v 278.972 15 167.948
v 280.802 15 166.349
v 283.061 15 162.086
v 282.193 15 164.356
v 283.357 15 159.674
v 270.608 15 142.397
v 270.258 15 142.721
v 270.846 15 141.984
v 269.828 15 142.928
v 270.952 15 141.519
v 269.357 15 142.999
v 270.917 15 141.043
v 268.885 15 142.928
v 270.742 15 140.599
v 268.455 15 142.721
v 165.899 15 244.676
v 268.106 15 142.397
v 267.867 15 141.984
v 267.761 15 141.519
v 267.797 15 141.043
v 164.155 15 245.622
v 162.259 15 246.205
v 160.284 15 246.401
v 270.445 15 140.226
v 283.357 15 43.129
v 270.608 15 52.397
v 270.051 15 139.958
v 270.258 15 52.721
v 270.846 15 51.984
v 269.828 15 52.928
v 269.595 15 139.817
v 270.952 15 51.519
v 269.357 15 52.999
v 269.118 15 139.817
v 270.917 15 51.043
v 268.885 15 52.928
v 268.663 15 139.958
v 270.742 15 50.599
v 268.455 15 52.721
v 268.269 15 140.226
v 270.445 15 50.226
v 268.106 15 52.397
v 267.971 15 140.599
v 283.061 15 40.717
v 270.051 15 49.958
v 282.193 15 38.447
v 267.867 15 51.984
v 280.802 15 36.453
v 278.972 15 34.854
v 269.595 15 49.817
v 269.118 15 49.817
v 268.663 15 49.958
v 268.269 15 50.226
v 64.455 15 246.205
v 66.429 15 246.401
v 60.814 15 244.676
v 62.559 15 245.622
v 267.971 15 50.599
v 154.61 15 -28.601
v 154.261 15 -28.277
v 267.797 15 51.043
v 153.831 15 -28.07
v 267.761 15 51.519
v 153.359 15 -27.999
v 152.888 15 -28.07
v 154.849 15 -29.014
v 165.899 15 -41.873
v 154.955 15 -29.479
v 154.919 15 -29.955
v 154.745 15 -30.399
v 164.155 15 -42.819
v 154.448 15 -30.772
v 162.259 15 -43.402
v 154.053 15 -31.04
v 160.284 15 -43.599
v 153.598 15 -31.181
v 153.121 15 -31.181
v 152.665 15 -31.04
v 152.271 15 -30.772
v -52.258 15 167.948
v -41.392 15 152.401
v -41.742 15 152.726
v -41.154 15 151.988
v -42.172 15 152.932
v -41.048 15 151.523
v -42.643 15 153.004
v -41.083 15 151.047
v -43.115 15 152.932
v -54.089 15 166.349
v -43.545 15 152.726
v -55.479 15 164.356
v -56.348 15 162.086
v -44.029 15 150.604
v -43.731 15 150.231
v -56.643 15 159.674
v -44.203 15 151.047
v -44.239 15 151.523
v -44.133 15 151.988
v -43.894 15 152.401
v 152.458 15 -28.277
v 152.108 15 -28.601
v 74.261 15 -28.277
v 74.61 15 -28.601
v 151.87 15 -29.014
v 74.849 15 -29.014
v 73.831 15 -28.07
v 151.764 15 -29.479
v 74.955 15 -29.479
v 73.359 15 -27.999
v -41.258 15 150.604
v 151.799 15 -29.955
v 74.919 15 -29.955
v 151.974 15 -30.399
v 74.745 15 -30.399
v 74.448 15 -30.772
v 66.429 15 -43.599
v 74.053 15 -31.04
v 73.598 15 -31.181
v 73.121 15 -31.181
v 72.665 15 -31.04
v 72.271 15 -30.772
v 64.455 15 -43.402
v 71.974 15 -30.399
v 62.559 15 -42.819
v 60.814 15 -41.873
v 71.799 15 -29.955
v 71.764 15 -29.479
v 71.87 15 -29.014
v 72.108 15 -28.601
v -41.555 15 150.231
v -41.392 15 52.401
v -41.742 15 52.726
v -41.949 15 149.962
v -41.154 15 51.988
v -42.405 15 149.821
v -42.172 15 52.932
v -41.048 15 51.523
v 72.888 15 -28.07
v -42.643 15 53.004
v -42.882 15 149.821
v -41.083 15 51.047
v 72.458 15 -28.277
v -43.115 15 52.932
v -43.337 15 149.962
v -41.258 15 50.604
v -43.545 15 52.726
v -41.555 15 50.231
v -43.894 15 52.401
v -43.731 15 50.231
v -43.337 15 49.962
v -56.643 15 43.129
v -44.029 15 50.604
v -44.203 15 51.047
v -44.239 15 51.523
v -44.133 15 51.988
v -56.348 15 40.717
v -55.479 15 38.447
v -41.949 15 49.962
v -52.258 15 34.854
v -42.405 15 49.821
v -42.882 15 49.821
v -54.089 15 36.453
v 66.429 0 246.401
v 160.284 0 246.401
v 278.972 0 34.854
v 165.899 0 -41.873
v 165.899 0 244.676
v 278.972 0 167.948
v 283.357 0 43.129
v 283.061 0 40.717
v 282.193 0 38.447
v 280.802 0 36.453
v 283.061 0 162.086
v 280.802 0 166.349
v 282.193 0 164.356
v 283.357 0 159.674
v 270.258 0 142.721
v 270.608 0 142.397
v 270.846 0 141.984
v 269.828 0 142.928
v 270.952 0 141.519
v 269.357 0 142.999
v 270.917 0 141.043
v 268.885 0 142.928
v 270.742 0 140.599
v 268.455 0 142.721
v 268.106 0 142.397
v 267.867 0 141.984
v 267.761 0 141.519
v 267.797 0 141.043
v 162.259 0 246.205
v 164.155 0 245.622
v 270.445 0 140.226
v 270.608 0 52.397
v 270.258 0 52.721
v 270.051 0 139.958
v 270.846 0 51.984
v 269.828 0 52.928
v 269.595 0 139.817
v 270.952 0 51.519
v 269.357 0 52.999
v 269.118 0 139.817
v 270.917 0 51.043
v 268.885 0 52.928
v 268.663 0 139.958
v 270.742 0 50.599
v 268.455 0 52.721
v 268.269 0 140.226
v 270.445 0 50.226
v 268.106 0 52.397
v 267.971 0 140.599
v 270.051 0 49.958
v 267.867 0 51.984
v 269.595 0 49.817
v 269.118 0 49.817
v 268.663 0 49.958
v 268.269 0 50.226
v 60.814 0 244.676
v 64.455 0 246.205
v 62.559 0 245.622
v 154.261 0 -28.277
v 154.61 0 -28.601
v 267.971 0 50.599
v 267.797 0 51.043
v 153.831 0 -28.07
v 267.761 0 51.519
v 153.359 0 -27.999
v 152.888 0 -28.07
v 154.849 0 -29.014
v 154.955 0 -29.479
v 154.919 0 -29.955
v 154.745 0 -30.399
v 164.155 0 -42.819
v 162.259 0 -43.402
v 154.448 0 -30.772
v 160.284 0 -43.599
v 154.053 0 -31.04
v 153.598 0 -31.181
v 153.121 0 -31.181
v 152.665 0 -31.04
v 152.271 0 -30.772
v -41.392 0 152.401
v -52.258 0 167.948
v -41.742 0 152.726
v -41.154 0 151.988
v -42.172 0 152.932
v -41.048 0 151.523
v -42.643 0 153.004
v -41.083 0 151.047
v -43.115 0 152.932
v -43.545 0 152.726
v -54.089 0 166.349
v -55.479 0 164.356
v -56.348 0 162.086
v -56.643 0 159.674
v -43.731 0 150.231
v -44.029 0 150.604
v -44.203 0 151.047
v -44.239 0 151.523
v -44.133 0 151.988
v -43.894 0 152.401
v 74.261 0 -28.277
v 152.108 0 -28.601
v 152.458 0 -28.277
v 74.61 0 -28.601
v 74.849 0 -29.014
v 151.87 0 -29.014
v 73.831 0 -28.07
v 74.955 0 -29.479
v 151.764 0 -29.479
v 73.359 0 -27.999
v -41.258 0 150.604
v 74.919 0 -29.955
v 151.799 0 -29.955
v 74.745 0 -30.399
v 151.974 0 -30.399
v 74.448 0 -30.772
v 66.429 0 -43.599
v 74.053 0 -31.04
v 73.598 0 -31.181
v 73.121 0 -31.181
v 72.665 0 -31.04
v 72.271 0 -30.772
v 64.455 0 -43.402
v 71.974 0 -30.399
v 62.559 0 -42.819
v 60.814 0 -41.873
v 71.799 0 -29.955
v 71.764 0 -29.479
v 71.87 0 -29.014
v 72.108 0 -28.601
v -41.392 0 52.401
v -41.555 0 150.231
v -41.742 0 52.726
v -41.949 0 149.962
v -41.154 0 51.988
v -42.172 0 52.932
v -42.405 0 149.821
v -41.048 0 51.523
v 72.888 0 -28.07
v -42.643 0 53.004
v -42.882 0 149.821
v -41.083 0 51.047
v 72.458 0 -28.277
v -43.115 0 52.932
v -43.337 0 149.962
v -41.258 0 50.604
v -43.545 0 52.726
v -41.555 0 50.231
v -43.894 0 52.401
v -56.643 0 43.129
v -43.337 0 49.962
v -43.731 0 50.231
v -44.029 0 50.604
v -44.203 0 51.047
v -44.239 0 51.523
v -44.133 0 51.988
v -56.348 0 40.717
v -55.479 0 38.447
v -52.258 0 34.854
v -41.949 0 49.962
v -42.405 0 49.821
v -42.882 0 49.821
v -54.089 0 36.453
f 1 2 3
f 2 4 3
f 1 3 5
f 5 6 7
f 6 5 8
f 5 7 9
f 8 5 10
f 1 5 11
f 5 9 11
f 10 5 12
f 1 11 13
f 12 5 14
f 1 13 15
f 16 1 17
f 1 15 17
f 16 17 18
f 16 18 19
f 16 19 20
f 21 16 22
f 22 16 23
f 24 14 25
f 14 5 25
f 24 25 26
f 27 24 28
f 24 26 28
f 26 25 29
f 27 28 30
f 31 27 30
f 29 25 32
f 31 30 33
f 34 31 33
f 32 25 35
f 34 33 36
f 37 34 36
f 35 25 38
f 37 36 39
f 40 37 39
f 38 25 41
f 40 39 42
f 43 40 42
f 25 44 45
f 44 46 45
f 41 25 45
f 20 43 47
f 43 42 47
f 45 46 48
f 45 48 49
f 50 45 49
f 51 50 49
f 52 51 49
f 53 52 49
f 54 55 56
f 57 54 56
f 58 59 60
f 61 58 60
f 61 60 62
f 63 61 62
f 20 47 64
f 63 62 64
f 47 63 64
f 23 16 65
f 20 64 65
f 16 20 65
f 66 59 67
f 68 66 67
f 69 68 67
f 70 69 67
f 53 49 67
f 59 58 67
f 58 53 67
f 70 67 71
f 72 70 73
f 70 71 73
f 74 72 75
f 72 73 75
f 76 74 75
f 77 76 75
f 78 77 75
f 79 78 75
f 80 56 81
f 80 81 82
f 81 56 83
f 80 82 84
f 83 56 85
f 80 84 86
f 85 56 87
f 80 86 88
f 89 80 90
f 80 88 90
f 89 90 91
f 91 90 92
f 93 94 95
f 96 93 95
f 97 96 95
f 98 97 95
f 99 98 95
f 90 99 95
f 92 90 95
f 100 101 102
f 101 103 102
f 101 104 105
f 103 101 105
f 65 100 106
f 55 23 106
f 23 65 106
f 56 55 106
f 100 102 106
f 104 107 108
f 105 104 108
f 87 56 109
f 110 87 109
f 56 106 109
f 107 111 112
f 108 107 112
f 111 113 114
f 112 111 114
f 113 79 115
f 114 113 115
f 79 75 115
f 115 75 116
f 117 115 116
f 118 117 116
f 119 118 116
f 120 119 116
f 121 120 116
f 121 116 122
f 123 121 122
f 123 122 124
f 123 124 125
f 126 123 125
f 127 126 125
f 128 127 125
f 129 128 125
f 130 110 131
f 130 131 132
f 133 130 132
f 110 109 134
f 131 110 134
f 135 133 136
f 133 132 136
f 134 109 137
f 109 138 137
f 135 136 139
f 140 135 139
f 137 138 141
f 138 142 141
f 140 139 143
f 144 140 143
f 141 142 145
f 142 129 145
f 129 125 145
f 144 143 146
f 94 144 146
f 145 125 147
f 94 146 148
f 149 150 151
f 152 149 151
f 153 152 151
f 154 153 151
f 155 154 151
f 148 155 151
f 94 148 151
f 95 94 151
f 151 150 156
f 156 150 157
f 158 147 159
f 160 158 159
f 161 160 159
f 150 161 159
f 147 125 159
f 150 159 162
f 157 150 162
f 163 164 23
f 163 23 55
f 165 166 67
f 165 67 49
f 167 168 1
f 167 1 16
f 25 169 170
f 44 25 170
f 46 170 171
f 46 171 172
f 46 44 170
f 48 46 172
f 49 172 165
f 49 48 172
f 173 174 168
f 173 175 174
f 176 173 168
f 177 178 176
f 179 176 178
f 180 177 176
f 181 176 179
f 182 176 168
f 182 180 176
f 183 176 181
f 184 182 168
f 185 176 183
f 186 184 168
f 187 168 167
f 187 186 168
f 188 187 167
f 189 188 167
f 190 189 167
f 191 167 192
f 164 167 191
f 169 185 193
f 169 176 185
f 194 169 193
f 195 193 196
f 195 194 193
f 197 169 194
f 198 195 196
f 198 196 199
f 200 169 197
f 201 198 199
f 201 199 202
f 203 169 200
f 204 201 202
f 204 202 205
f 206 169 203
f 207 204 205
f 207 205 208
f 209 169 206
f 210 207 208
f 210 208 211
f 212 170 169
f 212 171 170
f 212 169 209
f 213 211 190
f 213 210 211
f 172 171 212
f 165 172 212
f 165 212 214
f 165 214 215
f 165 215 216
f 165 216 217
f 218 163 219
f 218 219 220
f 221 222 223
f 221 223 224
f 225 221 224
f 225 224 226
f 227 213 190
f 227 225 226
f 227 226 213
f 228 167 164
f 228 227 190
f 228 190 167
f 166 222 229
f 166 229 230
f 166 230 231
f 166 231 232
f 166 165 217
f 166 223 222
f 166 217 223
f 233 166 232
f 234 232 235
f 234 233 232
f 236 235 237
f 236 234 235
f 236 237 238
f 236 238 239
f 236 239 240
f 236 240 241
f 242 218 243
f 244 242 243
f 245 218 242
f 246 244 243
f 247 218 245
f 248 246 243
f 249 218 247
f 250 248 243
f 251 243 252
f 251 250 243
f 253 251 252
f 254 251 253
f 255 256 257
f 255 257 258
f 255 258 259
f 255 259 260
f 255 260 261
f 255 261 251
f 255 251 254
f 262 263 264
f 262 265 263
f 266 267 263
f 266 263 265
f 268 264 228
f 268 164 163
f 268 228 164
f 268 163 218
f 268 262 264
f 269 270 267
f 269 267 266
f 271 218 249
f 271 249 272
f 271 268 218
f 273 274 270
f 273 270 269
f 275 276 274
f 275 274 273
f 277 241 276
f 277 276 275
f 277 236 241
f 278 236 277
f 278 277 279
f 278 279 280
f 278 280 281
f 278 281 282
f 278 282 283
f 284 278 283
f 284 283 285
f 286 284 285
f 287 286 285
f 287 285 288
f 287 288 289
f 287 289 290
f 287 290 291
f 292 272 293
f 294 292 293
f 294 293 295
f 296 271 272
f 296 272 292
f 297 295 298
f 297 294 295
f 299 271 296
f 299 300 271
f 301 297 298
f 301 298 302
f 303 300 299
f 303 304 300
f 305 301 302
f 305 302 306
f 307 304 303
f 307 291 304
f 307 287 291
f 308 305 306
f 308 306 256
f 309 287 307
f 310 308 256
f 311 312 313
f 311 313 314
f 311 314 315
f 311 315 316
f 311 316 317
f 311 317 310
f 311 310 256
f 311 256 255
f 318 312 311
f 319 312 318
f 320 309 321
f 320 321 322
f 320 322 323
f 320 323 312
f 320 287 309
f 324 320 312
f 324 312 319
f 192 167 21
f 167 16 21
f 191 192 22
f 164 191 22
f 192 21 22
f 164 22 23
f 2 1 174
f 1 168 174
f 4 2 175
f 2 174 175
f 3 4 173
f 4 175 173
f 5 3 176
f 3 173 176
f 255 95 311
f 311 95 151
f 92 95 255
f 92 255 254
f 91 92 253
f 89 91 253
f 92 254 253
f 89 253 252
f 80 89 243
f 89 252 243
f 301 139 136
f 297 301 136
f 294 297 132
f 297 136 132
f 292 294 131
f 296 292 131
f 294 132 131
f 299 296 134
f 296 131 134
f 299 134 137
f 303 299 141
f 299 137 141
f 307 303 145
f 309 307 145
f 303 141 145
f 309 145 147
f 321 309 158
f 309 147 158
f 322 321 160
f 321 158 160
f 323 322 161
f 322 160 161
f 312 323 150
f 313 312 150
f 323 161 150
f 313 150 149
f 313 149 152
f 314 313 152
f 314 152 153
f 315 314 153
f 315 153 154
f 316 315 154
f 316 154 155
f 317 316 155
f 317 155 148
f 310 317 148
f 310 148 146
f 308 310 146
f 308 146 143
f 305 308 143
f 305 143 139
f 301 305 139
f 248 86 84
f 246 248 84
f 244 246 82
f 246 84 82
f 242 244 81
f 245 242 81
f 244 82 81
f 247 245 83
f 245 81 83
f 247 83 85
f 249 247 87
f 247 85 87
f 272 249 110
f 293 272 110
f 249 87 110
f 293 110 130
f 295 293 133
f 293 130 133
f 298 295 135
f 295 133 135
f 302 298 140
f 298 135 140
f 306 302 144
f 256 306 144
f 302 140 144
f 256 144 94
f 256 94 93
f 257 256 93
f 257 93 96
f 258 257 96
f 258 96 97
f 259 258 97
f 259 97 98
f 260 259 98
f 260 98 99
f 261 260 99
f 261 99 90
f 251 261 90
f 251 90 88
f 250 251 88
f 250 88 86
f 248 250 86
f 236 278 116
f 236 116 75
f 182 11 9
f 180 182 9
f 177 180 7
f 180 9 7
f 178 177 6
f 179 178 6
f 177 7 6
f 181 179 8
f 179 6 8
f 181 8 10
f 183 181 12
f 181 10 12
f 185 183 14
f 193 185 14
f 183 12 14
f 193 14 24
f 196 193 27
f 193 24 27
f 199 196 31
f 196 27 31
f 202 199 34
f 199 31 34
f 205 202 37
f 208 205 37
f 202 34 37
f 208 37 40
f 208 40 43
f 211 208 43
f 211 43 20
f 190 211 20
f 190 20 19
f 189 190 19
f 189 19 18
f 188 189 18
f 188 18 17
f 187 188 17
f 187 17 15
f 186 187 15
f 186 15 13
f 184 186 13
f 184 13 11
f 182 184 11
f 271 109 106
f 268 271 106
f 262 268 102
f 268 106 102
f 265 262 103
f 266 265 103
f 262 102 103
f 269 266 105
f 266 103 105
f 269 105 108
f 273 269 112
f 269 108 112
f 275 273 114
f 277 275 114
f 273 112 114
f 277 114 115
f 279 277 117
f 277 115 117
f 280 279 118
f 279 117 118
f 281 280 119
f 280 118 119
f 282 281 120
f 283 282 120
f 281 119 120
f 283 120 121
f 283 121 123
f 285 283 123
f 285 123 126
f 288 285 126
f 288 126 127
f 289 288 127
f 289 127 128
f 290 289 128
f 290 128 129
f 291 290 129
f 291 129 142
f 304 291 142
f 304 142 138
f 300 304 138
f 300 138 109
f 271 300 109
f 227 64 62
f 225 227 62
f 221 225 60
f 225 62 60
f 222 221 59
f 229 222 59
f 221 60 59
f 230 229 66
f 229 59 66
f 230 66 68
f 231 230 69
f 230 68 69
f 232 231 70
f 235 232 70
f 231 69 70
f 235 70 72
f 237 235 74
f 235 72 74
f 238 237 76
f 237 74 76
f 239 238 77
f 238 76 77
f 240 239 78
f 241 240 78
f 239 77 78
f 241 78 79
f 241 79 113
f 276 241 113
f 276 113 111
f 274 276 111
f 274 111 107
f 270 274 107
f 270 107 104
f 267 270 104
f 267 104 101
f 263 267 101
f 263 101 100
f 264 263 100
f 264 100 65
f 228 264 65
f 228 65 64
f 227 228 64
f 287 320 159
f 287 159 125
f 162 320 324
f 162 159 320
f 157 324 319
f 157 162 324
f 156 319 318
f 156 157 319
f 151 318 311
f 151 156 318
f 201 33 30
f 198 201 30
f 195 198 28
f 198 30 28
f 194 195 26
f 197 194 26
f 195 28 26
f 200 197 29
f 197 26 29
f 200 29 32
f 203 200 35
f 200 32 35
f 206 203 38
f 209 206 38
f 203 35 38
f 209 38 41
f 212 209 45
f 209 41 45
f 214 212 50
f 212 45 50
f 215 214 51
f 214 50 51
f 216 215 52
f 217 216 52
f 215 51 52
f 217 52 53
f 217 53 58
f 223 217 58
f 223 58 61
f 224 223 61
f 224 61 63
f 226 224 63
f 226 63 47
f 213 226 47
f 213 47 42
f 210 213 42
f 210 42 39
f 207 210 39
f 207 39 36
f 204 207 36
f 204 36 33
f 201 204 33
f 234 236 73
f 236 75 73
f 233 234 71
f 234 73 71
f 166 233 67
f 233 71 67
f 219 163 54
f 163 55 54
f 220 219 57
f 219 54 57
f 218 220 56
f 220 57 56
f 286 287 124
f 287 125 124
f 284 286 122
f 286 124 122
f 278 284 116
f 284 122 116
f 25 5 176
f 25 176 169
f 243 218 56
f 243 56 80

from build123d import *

# Parameters (mm, degrees)
BOSS_EXTRU_1_DEPTH       = 15
CONG_10_R                = 10
ENL_V_MAT_EXTRU_13_REACH = 393.106
ESQUISSE13_W             = 20
ESQUISSE13_H             = 143.033455182
ESQUISSE13_H_2           = 181.308681646
CONG_12_R                = 10
ENL_V_MAT_EXTRU_14_REACH = 377.805
ESQUISSE14_R             = 1.6


with BuildPart() as part:
    # Esquisse1 → Boss.-Extru.1 (new body)
    with BuildSketch(Plane(origin=(0, 0, 0), x_dir=(1, 0, 0), z_dir=(0, 1, 0))):
        Polygon((-76.643189126, -51.401333399), (63.356810874, 43.598666601), (163.356810874, 43.598666601), (303.356810874, -51.401333399), (303.356810874, -151.401333399), (163.356810874, -246.401333399), (63.356810874, -246.401333399), (-76.643189126, -151.401333399), align=None)
    extrude(amount=BOSS_EXTRU_1_DEPTH)

    # Congé10
    cong_10_edges = [part.edges().sort_by_distance(p)[0] for p in [
        (-76.643189126, 7.5, 51.401333399),
        (63.356810874, 7.5, -43.598666601),
        (163.356810874, 7.5, -43.598666601),
        (303.356810874, 7.5, 51.401333399),
        (303.356810874, 7.5, 151.401333399),
        (163.356810874, 7.5, 246.401333399),
        (63.356810874, 7.5, 246.401333399),
        (-76.643189126, 7.5, 151.401333399),
    ]]
    fillet(cong_10_edges, radius=CONG_10_R)

    # Esquisse13 → Enlèv. mat.-Extru.13 (cut, up to next)
    with BuildSketch(Plane(origin=(0, 15, 0), x_dir=(1, 0, 0), z_dir=(0, 1, 0)), mode=Mode.PRIVATE) as enl_v_mat_extru_13_sk1:
        with Locations((-66.643189126, -101.968599131)):
            Rectangle(ESQUISSE13_W, ESQUISSE13_H)
    enl_v_mat_extru_13_tool1 = extrude(enl_v_mat_extru_13_sk1.sketch, amount=-ENL_V_MAT_EXTRU_13_REACH, mode=Mode.PRIVATE) & part.part
    # Esquisse13 → Enlèv. mat.-Extru.13 (cut, up to next)
    with BuildSketch(Plane(origin=(0, 15, 0), x_dir=(1, 0, 0), z_dir=(0, 1, 0)), mode=Mode.PRIVATE) as enl_v_mat_extru_13_sk2:
        with Locations((293.356810874, -101.059068944)):
            Rectangle(ESQUISSE13_W, ESQUISSE13_H_2)
    enl_v_mat_extru_13_tool2 = extrude(enl_v_mat_extru_13_sk2.sketch, amount=-ENL_V_MAT_EXTRU_13_REACH, mode=Mode.PRIVATE) & part.part
    add(enl_v_mat_extru_13_tool1.solids().sort_by_distance((-66.643189, 15, 101.968599))[0], mode=Mode.SUBTRACT)
    add(enl_v_mat_extru_13_tool2.solids().sort_by_distance((293.356811, 15, 101.059069))[0], mode=Mode.SUBTRACT)

    # Congé12
    cong_12_edges = [part.edges().sort_by_distance(p)[0] for p in [
        (-56.643189126, 7.5, 37.829904828),
        (-56.643189126, 7.5, 164.97276197),
        (283.356810874, 7.5, 37.829904828),
        (283.356810874, 7.5, 164.97276197),
    ]]
    fillet(cong_12_edges, radius=CONG_12_R)

    # Esquisse14 → Enlèv. mat.-Extru.14 (cut, up to next)
    with BuildSketch(Plane(origin=(0, 15, 0), x_dir=(1, 0, 0), z_dir=(0, 1, 0)), mode=Mode.PRIVATE) as enl_v_mat_extru_14_sk1:
        with Locations(Location((-42.643189126, -51.403530316, 0), (0, 0, 270))):
            Circle(ESQUISSE14_R)
    enl_v_mat_extru_14_tool1 = extrude(enl_v_mat_extru_14_sk1.sketch, amount=-ENL_V_MAT_EXTRU_14_REACH, mode=Mode.PRIVATE) & part.part
    # Esquisse14 → Enlèv. mat.-Extru.14 (cut, up to next)
    with BuildSketch(Plane(origin=(0, 15, 0), x_dir=(1, 0, 0), z_dir=(0, 1, 0)), mode=Mode.PRIVATE) as enl_v_mat_extru_14_sk2:
        with Locations(Location((-42.643189126, -151.403530316, 0), (0, 0, 270))):
            Circle(ESQUISSE14_R)
    enl_v_mat_extru_14_tool2 = extrude(enl_v_mat_extru_14_sk2.sketch, amount=-ENL_V_MAT_EXTRU_14_REACH, mode=Mode.PRIVATE) & part.part
    # Esquisse14 → Enlèv. mat.-Extru.14 (cut, up to next)
    with BuildSketch(Plane(origin=(0, 15, 0), x_dir=(1, 0, 0), z_dir=(0, 1, 0)), mode=Mode.PRIVATE) as enl_v_mat_extru_14_sk3:
        with Locations(Location((73.359258963, 29.598666601, 0), (0, 0, 270))):
            Circle(ESQUISSE14_R)
    enl_v_mat_extru_14_tool3 = extrude(enl_v_mat_extru_14_sk3.sketch, amount=-ENL_V_MAT_EXTRU_14_REACH, mode=Mode.PRIVATE) & part.part
    # Esquisse14 → Enlèv. mat.-Extru.14 (cut, up to next)
    with BuildSketch(Plane(origin=(0, 15, 0), x_dir=(1, 0, 0), z_dir=(0, 1, 0)), mode=Mode.PRIVATE) as enl_v_mat_extru_14_sk4:
        with Locations(Location((153.359258963, 29.598666601, 0), (0, 0, 270))):
            Circle(ESQUISSE14_R)
    enl_v_mat_extru_14_tool4 = extrude(enl_v_mat_extru_14_sk4.sketch, amount=-ENL_V_MAT_EXTRU_14_REACH, mode=Mode.PRIVATE) & part.part
    # Esquisse14 → Enlèv. mat.-Extru.14 (cut, up to next)
    with BuildSketch(Plane(origin=(0, 15, 0), x_dir=(1, 0, 0), z_dir=(0, 1, 0)), mode=Mode.PRIVATE) as enl_v_mat_extru_14_sk5:
        with Locations(Location((269.356810874, -51.399136482, 0), (0, 0, 270))):
            Circle(ESQUISSE14_R)
    enl_v_mat_extru_14_tool5 = extrude(enl_v_mat_extru_14_sk5.sketch, amount=-ENL_V_MAT_EXTRU_14_REACH, mode=Mode.PRIVATE) & part.part
    # Esquisse14 → Enlèv. mat.-Extru.14 (cut, up to next)
    with BuildSketch(Plane(origin=(0, 15, 0), x_dir=(1, 0, 0), z_dir=(0, 1, 0)), mode=Mode.PRIVATE) as enl_v_mat_extru_14_sk6:
        with Locations(Location((269.356810874, -141.399136482, 0), (0, 0, 270))):
            Circle(ESQUISSE14_R)
    enl_v_mat_extru_14_tool6 = extrude(enl_v_mat_extru_14_sk6.sketch, amount=-ENL_V_MAT_EXTRU_14_REACH, mode=Mode.PRIVATE) & part.part
    add(enl_v_mat_extru_14_tool1.solids().sort_by_distance((-42.643189, 15, 51.40353))[0], mode=Mode.SUBTRACT)
    add(enl_v_mat_extru_14_tool2.solids().sort_by_distance((-42.643189, 15, 151.40353))[0], mode=Mode.SUBTRACT)
    add(enl_v_mat_extru_14_tool3.solids().sort_by_distance((73.359259, 15, -29.598667))[0], mode=Mode.SUBTRACT)
    add(enl_v_mat_extru_14_tool4.solids().sort_by_distance((153.359259, 15, -29.598667))[0], mode=Mode.SUBTRACT)
    add(enl_v_mat_extru_14_tool5.solids().sort_by_distance((269.356811, 15, 51.399136))[0], mode=Mode.SUBTRACT)
    add(enl_v_mat_extru_14_tool6.solids().sort_by_distance((269.356811, 15, 141.399136))[0], mode=Mode.SUBTRACT)


solid = part.part
